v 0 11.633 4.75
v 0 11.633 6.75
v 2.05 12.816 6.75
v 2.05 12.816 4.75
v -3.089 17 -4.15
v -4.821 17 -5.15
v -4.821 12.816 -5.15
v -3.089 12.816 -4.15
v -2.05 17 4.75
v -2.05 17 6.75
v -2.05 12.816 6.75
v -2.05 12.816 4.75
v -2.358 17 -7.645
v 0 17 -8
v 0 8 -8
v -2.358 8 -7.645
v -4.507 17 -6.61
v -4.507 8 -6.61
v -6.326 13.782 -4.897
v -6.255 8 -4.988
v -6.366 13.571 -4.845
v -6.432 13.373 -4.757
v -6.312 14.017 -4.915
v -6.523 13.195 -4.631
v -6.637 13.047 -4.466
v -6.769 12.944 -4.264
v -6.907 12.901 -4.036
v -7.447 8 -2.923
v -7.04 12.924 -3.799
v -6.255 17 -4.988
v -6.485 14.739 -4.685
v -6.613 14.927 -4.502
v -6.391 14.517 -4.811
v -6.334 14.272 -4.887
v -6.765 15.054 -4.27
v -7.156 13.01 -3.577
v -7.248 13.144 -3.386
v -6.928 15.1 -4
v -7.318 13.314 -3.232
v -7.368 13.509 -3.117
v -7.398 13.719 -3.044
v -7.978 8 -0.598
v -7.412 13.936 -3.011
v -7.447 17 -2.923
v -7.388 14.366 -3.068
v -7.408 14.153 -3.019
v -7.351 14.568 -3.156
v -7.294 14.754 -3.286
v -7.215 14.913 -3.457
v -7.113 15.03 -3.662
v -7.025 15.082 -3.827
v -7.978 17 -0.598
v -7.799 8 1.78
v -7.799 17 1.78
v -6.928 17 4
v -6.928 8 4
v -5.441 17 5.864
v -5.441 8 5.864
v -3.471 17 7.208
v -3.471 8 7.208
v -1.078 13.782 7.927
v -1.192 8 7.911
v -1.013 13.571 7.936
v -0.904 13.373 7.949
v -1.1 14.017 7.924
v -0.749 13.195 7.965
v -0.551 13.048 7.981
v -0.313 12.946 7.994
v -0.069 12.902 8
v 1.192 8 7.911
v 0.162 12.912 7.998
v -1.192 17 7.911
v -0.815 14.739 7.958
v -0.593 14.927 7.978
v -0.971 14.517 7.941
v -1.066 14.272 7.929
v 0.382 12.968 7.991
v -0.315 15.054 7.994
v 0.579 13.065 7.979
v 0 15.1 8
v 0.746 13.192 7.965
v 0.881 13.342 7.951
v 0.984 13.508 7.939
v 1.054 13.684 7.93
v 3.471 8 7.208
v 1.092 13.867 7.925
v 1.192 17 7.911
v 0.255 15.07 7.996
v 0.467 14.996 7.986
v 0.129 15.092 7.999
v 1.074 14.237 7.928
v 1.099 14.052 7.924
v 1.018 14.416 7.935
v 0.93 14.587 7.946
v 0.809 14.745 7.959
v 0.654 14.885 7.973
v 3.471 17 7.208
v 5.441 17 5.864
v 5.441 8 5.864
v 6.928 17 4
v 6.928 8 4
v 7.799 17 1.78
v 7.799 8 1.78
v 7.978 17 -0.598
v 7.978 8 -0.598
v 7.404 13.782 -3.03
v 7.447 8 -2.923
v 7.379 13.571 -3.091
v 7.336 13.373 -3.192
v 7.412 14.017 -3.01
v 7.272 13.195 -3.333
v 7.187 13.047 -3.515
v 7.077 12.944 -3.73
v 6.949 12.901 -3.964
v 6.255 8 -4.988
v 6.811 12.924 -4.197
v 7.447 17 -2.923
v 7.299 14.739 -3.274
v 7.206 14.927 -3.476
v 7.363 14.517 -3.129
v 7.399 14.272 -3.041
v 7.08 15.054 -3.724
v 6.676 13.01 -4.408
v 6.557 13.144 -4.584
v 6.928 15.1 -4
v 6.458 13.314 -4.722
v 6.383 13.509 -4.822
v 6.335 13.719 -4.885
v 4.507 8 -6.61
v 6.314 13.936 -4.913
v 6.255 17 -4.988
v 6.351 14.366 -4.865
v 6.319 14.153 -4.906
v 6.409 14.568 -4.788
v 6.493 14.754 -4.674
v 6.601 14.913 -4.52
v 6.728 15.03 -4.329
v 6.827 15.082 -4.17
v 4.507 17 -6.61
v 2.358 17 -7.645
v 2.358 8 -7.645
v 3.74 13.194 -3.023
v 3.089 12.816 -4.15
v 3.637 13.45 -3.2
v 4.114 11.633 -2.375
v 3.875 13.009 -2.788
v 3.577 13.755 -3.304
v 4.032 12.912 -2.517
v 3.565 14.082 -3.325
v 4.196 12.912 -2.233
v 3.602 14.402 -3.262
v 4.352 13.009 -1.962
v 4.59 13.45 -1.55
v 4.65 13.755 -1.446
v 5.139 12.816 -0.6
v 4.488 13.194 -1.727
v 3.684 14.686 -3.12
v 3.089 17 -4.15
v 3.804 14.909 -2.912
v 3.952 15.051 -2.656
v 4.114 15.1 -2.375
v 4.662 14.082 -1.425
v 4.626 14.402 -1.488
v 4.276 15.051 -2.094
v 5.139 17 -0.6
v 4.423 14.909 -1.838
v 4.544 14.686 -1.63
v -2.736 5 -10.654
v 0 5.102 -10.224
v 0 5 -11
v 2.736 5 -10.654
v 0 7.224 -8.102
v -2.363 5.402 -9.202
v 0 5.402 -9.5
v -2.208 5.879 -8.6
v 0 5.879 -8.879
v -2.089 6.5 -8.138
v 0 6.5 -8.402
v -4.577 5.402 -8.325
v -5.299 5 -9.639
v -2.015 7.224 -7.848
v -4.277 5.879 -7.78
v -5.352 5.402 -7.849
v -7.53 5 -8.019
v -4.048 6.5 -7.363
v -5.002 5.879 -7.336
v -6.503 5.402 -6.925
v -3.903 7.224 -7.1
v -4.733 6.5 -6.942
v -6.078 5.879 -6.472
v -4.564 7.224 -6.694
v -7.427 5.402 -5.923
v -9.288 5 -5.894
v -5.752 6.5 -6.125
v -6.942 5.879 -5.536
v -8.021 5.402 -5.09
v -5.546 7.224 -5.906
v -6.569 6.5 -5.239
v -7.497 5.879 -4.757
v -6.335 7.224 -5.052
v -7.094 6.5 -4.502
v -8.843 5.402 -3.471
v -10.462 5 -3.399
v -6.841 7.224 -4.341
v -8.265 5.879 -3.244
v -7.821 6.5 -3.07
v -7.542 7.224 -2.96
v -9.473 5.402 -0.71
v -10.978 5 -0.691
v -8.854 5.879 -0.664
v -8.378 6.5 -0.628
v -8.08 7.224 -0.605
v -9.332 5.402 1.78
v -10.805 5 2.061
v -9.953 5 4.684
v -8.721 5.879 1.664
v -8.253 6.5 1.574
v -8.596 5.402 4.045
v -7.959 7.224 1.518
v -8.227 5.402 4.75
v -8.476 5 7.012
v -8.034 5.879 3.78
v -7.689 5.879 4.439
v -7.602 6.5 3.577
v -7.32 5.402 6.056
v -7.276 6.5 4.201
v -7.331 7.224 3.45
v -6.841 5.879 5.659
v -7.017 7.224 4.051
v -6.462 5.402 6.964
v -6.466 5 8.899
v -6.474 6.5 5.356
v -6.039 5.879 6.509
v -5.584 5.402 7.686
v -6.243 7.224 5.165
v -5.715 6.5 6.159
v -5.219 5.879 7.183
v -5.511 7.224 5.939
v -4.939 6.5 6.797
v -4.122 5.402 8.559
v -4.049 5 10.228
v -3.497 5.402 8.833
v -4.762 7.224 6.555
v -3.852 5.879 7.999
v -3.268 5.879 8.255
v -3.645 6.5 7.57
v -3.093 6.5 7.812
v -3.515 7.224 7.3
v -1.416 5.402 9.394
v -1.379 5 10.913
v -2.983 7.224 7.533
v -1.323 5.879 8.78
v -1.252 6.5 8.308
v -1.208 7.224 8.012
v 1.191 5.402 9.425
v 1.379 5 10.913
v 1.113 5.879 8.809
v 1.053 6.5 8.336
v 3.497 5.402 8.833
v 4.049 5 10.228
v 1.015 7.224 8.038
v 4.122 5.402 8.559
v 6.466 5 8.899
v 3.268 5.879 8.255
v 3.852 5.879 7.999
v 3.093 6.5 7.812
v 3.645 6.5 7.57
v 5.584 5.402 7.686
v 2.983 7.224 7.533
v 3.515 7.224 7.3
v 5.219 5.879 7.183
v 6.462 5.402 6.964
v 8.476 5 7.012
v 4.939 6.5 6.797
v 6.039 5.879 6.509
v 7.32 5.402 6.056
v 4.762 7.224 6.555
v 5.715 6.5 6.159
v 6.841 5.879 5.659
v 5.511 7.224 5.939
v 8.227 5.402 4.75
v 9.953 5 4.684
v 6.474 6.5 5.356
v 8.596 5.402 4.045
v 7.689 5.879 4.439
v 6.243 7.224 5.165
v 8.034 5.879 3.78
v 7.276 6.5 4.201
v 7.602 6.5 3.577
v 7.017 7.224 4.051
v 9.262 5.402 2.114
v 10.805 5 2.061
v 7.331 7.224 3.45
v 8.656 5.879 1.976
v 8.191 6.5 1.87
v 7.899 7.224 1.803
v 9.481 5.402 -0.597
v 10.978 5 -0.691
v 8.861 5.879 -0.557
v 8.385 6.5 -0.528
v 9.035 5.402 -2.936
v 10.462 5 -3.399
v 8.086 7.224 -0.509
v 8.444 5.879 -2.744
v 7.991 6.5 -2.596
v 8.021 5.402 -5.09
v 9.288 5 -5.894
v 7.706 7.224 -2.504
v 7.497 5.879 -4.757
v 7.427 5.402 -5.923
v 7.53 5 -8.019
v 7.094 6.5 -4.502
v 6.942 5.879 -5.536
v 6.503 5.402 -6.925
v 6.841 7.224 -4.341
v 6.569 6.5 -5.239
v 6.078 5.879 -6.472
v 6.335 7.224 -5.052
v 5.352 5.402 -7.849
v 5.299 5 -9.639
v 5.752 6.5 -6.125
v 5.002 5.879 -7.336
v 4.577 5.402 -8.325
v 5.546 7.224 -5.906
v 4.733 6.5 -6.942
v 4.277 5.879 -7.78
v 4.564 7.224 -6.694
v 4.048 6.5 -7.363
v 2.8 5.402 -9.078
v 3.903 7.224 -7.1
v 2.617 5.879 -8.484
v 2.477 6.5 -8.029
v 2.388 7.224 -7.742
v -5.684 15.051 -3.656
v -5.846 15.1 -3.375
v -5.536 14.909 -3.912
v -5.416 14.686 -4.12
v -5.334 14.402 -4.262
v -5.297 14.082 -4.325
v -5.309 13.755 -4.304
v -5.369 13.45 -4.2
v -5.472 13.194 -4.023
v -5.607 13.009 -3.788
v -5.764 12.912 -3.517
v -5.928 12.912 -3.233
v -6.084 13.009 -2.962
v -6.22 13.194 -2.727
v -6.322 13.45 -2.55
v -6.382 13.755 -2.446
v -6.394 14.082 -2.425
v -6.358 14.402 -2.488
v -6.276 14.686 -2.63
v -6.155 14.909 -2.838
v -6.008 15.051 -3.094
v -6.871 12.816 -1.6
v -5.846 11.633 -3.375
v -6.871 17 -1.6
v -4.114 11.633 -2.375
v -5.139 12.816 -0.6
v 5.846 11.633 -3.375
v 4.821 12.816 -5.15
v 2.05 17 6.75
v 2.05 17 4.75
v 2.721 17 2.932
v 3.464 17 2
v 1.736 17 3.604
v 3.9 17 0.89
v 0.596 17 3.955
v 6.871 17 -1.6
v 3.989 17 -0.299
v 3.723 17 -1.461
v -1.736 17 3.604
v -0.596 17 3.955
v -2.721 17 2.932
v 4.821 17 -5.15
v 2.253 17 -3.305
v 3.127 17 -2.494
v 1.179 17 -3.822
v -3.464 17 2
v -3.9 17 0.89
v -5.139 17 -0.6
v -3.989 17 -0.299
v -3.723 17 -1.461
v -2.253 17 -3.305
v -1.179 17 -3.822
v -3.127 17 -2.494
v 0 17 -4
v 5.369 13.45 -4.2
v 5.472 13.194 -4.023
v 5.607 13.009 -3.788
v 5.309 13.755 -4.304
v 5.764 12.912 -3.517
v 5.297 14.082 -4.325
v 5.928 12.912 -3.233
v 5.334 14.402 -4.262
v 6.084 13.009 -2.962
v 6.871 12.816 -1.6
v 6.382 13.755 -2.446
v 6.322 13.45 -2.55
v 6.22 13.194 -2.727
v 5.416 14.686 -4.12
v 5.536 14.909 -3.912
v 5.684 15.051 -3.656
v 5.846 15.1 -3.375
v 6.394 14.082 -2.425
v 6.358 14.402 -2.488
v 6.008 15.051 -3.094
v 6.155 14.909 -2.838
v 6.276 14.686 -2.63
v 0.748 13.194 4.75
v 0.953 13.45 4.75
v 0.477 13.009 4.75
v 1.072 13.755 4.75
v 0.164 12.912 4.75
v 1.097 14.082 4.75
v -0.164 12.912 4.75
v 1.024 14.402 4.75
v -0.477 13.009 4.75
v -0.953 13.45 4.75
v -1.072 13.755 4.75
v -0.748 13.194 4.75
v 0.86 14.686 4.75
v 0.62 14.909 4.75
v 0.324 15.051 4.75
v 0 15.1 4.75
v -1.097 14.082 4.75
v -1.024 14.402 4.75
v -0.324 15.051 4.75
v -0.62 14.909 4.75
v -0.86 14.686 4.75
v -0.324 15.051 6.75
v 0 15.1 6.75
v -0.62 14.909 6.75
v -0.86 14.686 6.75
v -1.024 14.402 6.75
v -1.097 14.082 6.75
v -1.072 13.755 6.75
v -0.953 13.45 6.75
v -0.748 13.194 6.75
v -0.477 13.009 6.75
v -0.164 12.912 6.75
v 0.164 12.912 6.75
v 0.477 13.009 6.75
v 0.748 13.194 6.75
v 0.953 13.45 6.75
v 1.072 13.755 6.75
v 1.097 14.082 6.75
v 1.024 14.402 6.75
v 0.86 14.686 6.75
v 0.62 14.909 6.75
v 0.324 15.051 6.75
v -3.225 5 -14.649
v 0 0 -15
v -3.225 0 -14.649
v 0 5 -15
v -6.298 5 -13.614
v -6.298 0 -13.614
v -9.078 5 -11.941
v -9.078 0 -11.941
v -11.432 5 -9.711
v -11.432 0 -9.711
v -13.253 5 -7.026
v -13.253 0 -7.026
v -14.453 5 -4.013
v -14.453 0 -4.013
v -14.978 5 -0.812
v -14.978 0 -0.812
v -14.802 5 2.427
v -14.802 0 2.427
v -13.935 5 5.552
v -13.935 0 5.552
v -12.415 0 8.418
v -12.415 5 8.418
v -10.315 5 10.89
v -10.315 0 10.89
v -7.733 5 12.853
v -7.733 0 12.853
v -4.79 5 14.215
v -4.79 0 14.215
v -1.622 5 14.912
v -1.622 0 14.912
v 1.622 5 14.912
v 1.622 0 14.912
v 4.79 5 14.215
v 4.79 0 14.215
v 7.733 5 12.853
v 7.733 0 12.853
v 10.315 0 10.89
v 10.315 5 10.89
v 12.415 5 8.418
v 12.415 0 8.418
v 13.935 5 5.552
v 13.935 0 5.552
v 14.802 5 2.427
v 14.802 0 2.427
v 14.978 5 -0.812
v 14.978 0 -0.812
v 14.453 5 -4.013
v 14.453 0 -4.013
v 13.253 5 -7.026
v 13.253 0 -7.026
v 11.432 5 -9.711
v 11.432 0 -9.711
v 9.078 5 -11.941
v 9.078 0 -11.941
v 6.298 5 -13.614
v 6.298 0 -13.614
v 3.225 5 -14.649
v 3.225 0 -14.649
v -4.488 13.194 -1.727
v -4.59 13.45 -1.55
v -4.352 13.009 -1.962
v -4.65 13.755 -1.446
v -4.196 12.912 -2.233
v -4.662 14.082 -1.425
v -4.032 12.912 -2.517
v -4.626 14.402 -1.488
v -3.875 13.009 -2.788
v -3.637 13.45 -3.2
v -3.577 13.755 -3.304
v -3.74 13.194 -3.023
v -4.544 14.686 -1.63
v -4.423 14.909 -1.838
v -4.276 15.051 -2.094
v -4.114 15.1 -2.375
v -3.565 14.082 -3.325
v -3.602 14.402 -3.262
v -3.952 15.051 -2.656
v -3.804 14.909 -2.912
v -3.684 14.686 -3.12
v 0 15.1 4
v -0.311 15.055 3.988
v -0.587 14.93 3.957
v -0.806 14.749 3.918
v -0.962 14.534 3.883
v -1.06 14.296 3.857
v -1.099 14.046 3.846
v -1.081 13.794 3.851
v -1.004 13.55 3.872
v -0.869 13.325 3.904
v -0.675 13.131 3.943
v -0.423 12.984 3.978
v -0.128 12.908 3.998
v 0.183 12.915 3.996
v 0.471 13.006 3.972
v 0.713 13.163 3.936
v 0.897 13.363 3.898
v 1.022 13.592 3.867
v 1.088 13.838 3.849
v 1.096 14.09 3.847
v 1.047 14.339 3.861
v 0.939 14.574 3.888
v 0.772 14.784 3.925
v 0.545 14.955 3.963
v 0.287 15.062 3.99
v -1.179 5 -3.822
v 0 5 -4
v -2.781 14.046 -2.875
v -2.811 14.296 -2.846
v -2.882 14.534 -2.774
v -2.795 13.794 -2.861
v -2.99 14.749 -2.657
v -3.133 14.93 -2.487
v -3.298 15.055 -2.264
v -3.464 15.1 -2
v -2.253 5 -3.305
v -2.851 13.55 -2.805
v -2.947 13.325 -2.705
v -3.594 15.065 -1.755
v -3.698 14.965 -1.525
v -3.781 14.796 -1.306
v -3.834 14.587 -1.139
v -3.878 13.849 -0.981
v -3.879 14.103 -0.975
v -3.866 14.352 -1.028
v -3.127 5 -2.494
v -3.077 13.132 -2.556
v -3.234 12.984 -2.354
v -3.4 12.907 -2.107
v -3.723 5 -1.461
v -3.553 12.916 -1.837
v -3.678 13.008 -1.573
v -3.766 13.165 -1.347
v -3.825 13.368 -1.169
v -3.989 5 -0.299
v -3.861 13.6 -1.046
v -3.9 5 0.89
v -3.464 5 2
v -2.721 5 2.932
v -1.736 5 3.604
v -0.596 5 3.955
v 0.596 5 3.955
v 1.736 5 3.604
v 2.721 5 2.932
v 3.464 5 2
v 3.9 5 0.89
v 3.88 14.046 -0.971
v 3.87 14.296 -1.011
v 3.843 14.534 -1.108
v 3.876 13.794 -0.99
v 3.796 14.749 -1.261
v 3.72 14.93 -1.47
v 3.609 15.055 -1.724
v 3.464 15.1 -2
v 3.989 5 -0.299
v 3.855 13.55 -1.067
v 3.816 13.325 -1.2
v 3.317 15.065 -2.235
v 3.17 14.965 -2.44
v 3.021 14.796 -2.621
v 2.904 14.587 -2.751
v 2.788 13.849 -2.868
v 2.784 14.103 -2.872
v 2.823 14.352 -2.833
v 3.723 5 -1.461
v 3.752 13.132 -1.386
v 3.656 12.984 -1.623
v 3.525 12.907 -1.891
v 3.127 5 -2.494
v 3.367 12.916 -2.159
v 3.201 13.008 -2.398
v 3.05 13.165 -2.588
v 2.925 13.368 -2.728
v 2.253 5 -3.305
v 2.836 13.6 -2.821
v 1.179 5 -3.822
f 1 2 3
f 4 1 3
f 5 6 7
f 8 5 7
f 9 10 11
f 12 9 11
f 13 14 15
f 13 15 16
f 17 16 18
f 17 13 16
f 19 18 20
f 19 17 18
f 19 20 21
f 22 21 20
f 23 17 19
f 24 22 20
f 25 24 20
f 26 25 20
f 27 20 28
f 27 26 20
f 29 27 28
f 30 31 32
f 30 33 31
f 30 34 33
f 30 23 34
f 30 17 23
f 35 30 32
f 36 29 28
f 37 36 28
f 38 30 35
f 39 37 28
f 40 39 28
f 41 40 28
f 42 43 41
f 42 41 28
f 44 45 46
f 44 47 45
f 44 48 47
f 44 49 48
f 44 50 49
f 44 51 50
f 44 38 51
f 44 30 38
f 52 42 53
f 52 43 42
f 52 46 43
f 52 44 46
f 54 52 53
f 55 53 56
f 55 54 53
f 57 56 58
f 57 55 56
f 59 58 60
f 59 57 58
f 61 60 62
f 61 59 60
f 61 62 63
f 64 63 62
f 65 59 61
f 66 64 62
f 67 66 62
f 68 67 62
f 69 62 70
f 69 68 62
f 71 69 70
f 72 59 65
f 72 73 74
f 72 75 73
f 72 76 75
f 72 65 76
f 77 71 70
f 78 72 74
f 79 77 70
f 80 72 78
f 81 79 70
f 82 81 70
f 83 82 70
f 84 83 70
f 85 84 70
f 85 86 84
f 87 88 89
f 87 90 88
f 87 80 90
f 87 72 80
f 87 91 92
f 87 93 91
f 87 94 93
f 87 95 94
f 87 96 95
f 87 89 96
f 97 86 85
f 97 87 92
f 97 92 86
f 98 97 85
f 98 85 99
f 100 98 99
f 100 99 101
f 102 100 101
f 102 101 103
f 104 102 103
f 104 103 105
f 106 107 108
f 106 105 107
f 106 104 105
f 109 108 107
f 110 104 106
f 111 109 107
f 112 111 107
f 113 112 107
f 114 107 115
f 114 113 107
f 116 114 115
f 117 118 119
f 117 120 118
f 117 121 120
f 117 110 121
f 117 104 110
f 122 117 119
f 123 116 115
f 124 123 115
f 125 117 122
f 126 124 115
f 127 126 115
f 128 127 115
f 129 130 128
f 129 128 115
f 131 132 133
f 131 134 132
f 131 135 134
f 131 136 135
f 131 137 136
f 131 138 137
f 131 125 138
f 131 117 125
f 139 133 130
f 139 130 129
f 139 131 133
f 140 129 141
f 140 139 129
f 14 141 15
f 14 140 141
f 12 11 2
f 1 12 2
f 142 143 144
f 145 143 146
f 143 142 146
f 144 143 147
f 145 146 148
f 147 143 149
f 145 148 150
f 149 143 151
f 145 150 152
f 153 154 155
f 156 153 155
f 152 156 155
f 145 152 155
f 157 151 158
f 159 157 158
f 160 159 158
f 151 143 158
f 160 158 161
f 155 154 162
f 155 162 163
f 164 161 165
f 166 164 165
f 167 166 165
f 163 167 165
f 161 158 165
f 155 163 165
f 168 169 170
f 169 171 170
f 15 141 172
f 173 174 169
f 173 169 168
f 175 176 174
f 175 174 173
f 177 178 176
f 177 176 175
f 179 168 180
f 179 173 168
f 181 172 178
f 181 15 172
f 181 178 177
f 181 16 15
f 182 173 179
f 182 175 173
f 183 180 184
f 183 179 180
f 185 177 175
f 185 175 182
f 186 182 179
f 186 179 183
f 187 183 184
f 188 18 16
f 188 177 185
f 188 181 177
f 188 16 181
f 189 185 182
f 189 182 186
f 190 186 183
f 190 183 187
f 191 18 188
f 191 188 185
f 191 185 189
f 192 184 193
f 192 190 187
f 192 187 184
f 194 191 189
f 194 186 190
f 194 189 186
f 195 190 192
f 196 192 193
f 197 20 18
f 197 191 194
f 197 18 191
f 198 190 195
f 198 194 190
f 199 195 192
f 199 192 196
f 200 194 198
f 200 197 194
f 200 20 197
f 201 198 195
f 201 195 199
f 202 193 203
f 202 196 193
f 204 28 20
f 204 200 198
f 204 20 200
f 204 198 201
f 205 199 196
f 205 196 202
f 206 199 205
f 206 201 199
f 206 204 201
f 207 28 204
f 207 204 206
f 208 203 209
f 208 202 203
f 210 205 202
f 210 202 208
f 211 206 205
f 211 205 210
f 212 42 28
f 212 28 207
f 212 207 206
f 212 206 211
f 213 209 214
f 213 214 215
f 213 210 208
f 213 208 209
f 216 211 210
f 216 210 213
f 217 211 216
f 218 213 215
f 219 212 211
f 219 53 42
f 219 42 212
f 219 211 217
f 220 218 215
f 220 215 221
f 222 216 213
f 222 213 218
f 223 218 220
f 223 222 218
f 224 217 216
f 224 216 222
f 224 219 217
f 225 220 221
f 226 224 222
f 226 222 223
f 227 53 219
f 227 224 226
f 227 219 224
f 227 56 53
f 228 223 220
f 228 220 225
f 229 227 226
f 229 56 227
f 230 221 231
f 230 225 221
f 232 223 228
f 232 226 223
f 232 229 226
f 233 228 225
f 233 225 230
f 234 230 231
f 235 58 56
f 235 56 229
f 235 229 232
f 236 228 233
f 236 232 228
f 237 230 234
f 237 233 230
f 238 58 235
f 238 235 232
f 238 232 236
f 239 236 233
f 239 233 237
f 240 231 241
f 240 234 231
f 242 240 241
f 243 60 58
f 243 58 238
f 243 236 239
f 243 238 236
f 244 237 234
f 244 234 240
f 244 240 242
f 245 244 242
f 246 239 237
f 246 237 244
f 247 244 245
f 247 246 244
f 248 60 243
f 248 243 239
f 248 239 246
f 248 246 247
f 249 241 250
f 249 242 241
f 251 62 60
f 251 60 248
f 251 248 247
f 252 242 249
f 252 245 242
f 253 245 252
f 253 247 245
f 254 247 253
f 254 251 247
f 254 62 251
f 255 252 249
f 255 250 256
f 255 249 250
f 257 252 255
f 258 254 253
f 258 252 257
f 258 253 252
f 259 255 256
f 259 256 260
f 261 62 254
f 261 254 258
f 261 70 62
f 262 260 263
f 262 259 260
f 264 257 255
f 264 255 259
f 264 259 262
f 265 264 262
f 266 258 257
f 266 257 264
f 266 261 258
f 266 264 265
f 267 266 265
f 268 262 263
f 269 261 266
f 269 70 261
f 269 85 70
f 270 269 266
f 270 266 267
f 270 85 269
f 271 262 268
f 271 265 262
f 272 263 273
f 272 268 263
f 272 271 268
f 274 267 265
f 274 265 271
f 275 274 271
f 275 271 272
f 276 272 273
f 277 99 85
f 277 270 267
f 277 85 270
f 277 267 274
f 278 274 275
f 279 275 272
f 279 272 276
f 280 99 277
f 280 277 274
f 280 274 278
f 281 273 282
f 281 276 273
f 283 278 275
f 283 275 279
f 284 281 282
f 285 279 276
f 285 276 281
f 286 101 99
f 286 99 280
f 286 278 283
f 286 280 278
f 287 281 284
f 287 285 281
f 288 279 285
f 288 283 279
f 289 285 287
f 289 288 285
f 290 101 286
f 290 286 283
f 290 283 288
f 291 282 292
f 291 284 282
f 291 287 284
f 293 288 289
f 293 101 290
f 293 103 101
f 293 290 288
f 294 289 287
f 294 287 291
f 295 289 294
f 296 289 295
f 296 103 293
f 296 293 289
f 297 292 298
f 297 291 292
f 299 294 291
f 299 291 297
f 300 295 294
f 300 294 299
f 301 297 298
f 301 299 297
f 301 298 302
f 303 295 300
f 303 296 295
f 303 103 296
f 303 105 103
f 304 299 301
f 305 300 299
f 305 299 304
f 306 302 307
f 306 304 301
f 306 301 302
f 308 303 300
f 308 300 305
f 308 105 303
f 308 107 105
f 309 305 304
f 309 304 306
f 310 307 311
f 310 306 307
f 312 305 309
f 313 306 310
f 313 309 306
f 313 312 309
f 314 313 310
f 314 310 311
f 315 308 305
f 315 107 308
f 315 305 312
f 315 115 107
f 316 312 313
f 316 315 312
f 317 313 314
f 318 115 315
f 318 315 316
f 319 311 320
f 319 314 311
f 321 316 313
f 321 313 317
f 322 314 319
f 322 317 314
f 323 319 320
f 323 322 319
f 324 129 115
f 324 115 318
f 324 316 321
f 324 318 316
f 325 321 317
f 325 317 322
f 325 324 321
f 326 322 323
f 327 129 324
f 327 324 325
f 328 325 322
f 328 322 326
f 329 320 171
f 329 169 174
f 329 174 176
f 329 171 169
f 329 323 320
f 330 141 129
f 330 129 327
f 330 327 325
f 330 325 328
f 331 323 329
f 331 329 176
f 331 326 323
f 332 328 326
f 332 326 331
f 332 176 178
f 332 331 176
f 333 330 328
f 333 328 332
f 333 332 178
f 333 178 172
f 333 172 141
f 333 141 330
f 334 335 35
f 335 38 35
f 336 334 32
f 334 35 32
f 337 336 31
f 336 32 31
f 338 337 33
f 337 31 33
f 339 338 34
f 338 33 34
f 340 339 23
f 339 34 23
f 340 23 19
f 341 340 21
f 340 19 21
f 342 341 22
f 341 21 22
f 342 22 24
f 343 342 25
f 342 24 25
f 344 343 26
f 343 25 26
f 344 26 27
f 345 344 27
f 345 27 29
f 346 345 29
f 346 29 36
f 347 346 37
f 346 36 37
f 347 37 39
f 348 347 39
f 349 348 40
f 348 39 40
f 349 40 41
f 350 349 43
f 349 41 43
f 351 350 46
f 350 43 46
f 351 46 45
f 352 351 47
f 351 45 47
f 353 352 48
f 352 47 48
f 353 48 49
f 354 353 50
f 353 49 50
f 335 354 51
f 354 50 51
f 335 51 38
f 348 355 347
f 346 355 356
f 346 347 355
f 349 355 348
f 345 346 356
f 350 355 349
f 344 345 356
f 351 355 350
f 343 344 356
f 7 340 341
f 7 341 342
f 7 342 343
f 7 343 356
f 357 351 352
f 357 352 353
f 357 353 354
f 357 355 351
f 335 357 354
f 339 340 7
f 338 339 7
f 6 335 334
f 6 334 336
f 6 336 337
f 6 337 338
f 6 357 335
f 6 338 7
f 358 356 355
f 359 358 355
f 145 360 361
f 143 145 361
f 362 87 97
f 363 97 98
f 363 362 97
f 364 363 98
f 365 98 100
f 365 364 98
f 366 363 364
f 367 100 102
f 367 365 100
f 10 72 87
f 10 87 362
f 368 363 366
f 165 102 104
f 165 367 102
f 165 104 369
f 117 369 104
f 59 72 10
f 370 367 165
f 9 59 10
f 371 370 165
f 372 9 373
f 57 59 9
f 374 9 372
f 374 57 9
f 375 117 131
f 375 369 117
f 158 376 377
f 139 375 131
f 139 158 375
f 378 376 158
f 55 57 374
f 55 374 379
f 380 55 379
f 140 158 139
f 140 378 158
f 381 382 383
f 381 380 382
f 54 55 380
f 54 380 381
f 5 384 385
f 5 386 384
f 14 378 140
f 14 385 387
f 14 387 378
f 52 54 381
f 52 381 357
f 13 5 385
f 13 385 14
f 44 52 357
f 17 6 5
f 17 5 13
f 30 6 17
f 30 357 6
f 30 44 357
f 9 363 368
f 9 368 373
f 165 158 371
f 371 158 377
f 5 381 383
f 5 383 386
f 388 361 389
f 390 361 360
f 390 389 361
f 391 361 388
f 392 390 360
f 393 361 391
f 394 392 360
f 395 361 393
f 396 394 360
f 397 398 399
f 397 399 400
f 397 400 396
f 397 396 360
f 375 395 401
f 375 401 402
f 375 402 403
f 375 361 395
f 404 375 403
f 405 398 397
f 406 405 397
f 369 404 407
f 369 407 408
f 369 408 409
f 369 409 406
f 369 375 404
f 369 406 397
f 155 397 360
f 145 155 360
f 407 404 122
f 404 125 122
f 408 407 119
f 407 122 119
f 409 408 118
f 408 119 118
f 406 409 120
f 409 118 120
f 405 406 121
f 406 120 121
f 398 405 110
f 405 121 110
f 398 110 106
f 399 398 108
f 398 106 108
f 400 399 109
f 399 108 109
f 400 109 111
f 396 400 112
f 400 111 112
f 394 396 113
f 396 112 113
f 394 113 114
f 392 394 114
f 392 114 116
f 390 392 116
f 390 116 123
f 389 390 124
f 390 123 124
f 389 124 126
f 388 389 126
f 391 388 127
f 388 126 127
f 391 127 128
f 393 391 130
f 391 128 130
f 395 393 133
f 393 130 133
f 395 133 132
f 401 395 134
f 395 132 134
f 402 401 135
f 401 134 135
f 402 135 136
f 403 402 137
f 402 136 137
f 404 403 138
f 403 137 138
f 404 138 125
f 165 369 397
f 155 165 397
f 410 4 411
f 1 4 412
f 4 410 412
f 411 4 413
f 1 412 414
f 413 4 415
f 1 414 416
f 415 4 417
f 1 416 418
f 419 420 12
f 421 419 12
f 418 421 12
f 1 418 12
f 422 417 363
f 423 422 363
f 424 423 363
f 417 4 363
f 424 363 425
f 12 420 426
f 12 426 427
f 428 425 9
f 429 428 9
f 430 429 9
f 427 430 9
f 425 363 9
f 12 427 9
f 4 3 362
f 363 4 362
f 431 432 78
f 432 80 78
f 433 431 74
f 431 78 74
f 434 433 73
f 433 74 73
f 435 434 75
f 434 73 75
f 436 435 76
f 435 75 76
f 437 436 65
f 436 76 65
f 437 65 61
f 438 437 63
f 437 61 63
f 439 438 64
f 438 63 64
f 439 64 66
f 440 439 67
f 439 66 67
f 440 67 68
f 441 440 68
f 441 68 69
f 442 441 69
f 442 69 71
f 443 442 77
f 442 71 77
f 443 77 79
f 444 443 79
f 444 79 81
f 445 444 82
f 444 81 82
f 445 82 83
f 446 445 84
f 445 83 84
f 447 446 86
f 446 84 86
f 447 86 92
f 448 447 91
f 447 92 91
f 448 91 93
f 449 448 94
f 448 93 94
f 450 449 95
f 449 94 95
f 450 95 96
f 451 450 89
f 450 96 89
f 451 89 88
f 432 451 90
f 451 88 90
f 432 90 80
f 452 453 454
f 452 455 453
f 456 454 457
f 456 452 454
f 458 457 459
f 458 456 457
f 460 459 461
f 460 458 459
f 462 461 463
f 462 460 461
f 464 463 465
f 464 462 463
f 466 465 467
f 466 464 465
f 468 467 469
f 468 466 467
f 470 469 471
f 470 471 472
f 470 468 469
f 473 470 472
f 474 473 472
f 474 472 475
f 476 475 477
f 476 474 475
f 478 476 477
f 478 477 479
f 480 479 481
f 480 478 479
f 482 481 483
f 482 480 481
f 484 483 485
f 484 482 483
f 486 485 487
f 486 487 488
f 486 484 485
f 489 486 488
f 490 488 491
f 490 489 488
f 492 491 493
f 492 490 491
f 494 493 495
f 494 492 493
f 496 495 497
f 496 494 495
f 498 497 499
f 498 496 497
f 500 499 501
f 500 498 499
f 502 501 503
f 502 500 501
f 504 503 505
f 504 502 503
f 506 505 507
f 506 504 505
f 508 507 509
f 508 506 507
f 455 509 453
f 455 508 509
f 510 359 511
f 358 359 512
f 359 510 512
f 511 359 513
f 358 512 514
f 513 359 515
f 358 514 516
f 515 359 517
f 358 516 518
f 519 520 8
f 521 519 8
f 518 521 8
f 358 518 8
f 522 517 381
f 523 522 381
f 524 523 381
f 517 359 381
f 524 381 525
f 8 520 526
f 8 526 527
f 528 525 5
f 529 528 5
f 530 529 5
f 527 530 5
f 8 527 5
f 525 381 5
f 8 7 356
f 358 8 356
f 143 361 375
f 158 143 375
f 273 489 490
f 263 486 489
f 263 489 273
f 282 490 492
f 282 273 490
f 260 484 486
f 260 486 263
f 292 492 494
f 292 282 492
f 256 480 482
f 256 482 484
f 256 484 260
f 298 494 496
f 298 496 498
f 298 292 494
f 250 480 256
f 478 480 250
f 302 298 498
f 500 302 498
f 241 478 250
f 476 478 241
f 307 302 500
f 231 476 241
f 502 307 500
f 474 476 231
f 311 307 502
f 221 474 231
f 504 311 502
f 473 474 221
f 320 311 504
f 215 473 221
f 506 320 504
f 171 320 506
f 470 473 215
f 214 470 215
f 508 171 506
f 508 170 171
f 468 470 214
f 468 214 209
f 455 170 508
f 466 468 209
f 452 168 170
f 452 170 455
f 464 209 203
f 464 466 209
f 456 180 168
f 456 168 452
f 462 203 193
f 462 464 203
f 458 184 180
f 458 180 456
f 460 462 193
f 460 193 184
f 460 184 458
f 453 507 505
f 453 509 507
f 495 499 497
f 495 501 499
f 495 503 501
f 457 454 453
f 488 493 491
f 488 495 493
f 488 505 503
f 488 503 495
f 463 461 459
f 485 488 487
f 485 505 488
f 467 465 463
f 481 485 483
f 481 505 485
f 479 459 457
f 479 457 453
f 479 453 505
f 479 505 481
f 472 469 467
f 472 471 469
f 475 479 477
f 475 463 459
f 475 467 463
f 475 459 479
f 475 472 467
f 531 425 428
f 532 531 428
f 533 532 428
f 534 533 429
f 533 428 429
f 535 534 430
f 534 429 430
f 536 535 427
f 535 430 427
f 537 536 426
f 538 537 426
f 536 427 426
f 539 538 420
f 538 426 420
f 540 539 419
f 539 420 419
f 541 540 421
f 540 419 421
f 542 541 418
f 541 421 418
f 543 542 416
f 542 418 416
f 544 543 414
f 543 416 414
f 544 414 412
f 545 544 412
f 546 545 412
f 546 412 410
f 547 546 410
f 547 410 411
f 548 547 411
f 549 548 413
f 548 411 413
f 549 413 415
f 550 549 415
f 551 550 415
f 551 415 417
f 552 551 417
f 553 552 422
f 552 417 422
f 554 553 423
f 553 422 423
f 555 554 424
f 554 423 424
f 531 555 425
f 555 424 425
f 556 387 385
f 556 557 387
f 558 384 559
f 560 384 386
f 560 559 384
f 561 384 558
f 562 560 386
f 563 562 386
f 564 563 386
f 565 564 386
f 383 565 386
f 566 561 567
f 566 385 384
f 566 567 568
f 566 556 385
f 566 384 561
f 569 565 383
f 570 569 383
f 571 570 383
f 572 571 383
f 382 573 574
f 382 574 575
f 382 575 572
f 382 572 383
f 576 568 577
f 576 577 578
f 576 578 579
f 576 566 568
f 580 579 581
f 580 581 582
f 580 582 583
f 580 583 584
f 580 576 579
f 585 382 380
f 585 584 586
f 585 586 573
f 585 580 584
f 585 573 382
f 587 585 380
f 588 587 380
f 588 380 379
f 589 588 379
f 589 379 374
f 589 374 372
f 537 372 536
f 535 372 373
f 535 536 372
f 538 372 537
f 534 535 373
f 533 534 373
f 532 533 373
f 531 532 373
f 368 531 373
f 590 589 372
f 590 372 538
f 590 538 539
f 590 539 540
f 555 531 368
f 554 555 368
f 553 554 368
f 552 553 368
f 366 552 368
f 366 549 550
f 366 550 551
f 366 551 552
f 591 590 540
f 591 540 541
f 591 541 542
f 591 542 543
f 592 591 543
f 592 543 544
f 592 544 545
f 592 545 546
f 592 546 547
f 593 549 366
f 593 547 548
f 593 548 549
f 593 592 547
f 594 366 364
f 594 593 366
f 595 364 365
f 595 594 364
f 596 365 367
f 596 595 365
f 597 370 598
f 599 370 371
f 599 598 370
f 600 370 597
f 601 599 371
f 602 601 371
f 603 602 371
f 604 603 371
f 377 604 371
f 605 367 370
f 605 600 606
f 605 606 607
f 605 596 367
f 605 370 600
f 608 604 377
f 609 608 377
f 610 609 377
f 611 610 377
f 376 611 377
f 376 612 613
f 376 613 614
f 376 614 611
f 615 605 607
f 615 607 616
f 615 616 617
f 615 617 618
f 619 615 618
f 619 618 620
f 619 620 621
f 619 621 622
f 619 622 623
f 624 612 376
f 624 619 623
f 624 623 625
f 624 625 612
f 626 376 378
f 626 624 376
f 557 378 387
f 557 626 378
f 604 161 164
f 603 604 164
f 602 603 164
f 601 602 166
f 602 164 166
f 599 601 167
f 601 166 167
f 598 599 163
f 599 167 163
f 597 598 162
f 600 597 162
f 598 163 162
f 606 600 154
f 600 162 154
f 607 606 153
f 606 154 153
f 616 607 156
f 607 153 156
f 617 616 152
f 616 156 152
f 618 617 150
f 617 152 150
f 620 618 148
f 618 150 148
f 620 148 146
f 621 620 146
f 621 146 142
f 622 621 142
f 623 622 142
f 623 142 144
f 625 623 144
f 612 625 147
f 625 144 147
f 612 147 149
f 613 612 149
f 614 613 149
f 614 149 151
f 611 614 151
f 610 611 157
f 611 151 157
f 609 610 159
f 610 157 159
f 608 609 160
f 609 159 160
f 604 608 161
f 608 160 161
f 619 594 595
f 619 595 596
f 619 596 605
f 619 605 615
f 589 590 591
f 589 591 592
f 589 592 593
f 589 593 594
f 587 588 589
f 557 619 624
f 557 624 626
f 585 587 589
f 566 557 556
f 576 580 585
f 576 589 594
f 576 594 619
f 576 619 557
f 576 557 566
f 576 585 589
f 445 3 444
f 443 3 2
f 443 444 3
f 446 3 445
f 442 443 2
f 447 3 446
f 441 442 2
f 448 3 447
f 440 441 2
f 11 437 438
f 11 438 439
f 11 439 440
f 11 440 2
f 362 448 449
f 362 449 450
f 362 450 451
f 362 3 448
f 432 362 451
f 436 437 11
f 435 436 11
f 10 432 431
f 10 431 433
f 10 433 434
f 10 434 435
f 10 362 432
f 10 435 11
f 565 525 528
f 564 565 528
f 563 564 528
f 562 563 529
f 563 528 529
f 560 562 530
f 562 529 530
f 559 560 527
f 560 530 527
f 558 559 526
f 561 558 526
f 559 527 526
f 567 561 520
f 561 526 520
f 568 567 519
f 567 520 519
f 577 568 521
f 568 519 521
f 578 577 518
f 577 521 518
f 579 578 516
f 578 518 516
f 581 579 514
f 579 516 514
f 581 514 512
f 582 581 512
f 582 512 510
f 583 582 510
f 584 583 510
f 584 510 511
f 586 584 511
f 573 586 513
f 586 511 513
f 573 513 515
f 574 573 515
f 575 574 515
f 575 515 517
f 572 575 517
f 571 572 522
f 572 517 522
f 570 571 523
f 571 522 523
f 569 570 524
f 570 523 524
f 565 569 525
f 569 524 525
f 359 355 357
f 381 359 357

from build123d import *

# Parameters (mm, degrees)
SKETCH4_W          = 1.1
SKETCH4_H          = 20.490381057
CUT_EXTRUDE1_START = -1.25
CUT_EXTRUDE1_DEPTH = 2
CIRPATTERN1_COUNT  = 3
FILLET1_R          = 3


with BuildPart() as part:
    # Sketch1 → Revolve1 (revolve)
    with BuildSketch(Plane.XY, mode=Mode.PRIVATE) as revolve1_sk:
        Polygon((0, 0), (15, 0), (15, 5), (8, 5), (8, 17), (4, 17), (4, 5), (0, 5), align=None)
    revolve(revolve1_sk.sketch.rotate(Axis((0, 0, 0), (0, 1, 0)), 90), axis=Axis((0, 0, 0), (0, 1, 0)))

    # Sketch4 → M2 Clearance Hole1 (revolve, cut)
    with BuildSketch(Plane(origin=(0, 14, 0), x_dir=(0, 1, 0), z_dir=(1, 0, 0))):
        with Locations((0.55, 10.245190529)):
            Rectangle(SKETCH4_W, SKETCH4_H)
    m2_clearance_hole1 = revolve(axis=Axis((0, 14, -6.35), (0, 0, 1)), mode=Mode.SUBTRACT)

    # Sketch5 → Cut-Extrude1 (cut)
    with BuildSketch(Plane.XY.offset(8).offset(CUT_EXTRUDE1_START)):
        Polygon((2.05, 17), (2.05, 15.183568052), (0, 16.367136104), (-2.05, 15.183568052), (-2.05, 17), align=None)
        Polygon((0, 11.632863896), (2.05, 12.816431948), (2.05, 15.183568052), (0, 16.367136104), (-2.05, 15.183568052), (-2.05, 12.816431948), align=None)
    cut_extrude1 = extrude(amount=-CUT_EXTRUDE1_DEPTH, mode=Mode.SUBTRACT)

    # CirPattern1: M2 Clearance Hole1, Cut-Extrude1 ×3 about axis
    cirpattern1_axis = Axis((0, 0, 0), (0, 1, 0))
    add([m2_clearance_hole1.rotate(cirpattern1_axis, i * 360 / CIRPATTERN1_COUNT) for i in range(1, CIRPATTERN1_COUNT)], mode=Mode.SUBTRACT)
    add([cut_extrude1.rotate(cirpattern1_axis, i * 360 / CIRPATTERN1_COUNT) for i in range(1, CIRPATTERN1_COUNT)], mode=Mode.SUBTRACT)

    # Fillet1
    fillet1_edges = [part.edges().sort_by_distance(p)[0] for p in [
        (0, 5, 8),
    ]]
    fillet(fillet1_edges, radius=FILLET1_R)


solid = part.part
